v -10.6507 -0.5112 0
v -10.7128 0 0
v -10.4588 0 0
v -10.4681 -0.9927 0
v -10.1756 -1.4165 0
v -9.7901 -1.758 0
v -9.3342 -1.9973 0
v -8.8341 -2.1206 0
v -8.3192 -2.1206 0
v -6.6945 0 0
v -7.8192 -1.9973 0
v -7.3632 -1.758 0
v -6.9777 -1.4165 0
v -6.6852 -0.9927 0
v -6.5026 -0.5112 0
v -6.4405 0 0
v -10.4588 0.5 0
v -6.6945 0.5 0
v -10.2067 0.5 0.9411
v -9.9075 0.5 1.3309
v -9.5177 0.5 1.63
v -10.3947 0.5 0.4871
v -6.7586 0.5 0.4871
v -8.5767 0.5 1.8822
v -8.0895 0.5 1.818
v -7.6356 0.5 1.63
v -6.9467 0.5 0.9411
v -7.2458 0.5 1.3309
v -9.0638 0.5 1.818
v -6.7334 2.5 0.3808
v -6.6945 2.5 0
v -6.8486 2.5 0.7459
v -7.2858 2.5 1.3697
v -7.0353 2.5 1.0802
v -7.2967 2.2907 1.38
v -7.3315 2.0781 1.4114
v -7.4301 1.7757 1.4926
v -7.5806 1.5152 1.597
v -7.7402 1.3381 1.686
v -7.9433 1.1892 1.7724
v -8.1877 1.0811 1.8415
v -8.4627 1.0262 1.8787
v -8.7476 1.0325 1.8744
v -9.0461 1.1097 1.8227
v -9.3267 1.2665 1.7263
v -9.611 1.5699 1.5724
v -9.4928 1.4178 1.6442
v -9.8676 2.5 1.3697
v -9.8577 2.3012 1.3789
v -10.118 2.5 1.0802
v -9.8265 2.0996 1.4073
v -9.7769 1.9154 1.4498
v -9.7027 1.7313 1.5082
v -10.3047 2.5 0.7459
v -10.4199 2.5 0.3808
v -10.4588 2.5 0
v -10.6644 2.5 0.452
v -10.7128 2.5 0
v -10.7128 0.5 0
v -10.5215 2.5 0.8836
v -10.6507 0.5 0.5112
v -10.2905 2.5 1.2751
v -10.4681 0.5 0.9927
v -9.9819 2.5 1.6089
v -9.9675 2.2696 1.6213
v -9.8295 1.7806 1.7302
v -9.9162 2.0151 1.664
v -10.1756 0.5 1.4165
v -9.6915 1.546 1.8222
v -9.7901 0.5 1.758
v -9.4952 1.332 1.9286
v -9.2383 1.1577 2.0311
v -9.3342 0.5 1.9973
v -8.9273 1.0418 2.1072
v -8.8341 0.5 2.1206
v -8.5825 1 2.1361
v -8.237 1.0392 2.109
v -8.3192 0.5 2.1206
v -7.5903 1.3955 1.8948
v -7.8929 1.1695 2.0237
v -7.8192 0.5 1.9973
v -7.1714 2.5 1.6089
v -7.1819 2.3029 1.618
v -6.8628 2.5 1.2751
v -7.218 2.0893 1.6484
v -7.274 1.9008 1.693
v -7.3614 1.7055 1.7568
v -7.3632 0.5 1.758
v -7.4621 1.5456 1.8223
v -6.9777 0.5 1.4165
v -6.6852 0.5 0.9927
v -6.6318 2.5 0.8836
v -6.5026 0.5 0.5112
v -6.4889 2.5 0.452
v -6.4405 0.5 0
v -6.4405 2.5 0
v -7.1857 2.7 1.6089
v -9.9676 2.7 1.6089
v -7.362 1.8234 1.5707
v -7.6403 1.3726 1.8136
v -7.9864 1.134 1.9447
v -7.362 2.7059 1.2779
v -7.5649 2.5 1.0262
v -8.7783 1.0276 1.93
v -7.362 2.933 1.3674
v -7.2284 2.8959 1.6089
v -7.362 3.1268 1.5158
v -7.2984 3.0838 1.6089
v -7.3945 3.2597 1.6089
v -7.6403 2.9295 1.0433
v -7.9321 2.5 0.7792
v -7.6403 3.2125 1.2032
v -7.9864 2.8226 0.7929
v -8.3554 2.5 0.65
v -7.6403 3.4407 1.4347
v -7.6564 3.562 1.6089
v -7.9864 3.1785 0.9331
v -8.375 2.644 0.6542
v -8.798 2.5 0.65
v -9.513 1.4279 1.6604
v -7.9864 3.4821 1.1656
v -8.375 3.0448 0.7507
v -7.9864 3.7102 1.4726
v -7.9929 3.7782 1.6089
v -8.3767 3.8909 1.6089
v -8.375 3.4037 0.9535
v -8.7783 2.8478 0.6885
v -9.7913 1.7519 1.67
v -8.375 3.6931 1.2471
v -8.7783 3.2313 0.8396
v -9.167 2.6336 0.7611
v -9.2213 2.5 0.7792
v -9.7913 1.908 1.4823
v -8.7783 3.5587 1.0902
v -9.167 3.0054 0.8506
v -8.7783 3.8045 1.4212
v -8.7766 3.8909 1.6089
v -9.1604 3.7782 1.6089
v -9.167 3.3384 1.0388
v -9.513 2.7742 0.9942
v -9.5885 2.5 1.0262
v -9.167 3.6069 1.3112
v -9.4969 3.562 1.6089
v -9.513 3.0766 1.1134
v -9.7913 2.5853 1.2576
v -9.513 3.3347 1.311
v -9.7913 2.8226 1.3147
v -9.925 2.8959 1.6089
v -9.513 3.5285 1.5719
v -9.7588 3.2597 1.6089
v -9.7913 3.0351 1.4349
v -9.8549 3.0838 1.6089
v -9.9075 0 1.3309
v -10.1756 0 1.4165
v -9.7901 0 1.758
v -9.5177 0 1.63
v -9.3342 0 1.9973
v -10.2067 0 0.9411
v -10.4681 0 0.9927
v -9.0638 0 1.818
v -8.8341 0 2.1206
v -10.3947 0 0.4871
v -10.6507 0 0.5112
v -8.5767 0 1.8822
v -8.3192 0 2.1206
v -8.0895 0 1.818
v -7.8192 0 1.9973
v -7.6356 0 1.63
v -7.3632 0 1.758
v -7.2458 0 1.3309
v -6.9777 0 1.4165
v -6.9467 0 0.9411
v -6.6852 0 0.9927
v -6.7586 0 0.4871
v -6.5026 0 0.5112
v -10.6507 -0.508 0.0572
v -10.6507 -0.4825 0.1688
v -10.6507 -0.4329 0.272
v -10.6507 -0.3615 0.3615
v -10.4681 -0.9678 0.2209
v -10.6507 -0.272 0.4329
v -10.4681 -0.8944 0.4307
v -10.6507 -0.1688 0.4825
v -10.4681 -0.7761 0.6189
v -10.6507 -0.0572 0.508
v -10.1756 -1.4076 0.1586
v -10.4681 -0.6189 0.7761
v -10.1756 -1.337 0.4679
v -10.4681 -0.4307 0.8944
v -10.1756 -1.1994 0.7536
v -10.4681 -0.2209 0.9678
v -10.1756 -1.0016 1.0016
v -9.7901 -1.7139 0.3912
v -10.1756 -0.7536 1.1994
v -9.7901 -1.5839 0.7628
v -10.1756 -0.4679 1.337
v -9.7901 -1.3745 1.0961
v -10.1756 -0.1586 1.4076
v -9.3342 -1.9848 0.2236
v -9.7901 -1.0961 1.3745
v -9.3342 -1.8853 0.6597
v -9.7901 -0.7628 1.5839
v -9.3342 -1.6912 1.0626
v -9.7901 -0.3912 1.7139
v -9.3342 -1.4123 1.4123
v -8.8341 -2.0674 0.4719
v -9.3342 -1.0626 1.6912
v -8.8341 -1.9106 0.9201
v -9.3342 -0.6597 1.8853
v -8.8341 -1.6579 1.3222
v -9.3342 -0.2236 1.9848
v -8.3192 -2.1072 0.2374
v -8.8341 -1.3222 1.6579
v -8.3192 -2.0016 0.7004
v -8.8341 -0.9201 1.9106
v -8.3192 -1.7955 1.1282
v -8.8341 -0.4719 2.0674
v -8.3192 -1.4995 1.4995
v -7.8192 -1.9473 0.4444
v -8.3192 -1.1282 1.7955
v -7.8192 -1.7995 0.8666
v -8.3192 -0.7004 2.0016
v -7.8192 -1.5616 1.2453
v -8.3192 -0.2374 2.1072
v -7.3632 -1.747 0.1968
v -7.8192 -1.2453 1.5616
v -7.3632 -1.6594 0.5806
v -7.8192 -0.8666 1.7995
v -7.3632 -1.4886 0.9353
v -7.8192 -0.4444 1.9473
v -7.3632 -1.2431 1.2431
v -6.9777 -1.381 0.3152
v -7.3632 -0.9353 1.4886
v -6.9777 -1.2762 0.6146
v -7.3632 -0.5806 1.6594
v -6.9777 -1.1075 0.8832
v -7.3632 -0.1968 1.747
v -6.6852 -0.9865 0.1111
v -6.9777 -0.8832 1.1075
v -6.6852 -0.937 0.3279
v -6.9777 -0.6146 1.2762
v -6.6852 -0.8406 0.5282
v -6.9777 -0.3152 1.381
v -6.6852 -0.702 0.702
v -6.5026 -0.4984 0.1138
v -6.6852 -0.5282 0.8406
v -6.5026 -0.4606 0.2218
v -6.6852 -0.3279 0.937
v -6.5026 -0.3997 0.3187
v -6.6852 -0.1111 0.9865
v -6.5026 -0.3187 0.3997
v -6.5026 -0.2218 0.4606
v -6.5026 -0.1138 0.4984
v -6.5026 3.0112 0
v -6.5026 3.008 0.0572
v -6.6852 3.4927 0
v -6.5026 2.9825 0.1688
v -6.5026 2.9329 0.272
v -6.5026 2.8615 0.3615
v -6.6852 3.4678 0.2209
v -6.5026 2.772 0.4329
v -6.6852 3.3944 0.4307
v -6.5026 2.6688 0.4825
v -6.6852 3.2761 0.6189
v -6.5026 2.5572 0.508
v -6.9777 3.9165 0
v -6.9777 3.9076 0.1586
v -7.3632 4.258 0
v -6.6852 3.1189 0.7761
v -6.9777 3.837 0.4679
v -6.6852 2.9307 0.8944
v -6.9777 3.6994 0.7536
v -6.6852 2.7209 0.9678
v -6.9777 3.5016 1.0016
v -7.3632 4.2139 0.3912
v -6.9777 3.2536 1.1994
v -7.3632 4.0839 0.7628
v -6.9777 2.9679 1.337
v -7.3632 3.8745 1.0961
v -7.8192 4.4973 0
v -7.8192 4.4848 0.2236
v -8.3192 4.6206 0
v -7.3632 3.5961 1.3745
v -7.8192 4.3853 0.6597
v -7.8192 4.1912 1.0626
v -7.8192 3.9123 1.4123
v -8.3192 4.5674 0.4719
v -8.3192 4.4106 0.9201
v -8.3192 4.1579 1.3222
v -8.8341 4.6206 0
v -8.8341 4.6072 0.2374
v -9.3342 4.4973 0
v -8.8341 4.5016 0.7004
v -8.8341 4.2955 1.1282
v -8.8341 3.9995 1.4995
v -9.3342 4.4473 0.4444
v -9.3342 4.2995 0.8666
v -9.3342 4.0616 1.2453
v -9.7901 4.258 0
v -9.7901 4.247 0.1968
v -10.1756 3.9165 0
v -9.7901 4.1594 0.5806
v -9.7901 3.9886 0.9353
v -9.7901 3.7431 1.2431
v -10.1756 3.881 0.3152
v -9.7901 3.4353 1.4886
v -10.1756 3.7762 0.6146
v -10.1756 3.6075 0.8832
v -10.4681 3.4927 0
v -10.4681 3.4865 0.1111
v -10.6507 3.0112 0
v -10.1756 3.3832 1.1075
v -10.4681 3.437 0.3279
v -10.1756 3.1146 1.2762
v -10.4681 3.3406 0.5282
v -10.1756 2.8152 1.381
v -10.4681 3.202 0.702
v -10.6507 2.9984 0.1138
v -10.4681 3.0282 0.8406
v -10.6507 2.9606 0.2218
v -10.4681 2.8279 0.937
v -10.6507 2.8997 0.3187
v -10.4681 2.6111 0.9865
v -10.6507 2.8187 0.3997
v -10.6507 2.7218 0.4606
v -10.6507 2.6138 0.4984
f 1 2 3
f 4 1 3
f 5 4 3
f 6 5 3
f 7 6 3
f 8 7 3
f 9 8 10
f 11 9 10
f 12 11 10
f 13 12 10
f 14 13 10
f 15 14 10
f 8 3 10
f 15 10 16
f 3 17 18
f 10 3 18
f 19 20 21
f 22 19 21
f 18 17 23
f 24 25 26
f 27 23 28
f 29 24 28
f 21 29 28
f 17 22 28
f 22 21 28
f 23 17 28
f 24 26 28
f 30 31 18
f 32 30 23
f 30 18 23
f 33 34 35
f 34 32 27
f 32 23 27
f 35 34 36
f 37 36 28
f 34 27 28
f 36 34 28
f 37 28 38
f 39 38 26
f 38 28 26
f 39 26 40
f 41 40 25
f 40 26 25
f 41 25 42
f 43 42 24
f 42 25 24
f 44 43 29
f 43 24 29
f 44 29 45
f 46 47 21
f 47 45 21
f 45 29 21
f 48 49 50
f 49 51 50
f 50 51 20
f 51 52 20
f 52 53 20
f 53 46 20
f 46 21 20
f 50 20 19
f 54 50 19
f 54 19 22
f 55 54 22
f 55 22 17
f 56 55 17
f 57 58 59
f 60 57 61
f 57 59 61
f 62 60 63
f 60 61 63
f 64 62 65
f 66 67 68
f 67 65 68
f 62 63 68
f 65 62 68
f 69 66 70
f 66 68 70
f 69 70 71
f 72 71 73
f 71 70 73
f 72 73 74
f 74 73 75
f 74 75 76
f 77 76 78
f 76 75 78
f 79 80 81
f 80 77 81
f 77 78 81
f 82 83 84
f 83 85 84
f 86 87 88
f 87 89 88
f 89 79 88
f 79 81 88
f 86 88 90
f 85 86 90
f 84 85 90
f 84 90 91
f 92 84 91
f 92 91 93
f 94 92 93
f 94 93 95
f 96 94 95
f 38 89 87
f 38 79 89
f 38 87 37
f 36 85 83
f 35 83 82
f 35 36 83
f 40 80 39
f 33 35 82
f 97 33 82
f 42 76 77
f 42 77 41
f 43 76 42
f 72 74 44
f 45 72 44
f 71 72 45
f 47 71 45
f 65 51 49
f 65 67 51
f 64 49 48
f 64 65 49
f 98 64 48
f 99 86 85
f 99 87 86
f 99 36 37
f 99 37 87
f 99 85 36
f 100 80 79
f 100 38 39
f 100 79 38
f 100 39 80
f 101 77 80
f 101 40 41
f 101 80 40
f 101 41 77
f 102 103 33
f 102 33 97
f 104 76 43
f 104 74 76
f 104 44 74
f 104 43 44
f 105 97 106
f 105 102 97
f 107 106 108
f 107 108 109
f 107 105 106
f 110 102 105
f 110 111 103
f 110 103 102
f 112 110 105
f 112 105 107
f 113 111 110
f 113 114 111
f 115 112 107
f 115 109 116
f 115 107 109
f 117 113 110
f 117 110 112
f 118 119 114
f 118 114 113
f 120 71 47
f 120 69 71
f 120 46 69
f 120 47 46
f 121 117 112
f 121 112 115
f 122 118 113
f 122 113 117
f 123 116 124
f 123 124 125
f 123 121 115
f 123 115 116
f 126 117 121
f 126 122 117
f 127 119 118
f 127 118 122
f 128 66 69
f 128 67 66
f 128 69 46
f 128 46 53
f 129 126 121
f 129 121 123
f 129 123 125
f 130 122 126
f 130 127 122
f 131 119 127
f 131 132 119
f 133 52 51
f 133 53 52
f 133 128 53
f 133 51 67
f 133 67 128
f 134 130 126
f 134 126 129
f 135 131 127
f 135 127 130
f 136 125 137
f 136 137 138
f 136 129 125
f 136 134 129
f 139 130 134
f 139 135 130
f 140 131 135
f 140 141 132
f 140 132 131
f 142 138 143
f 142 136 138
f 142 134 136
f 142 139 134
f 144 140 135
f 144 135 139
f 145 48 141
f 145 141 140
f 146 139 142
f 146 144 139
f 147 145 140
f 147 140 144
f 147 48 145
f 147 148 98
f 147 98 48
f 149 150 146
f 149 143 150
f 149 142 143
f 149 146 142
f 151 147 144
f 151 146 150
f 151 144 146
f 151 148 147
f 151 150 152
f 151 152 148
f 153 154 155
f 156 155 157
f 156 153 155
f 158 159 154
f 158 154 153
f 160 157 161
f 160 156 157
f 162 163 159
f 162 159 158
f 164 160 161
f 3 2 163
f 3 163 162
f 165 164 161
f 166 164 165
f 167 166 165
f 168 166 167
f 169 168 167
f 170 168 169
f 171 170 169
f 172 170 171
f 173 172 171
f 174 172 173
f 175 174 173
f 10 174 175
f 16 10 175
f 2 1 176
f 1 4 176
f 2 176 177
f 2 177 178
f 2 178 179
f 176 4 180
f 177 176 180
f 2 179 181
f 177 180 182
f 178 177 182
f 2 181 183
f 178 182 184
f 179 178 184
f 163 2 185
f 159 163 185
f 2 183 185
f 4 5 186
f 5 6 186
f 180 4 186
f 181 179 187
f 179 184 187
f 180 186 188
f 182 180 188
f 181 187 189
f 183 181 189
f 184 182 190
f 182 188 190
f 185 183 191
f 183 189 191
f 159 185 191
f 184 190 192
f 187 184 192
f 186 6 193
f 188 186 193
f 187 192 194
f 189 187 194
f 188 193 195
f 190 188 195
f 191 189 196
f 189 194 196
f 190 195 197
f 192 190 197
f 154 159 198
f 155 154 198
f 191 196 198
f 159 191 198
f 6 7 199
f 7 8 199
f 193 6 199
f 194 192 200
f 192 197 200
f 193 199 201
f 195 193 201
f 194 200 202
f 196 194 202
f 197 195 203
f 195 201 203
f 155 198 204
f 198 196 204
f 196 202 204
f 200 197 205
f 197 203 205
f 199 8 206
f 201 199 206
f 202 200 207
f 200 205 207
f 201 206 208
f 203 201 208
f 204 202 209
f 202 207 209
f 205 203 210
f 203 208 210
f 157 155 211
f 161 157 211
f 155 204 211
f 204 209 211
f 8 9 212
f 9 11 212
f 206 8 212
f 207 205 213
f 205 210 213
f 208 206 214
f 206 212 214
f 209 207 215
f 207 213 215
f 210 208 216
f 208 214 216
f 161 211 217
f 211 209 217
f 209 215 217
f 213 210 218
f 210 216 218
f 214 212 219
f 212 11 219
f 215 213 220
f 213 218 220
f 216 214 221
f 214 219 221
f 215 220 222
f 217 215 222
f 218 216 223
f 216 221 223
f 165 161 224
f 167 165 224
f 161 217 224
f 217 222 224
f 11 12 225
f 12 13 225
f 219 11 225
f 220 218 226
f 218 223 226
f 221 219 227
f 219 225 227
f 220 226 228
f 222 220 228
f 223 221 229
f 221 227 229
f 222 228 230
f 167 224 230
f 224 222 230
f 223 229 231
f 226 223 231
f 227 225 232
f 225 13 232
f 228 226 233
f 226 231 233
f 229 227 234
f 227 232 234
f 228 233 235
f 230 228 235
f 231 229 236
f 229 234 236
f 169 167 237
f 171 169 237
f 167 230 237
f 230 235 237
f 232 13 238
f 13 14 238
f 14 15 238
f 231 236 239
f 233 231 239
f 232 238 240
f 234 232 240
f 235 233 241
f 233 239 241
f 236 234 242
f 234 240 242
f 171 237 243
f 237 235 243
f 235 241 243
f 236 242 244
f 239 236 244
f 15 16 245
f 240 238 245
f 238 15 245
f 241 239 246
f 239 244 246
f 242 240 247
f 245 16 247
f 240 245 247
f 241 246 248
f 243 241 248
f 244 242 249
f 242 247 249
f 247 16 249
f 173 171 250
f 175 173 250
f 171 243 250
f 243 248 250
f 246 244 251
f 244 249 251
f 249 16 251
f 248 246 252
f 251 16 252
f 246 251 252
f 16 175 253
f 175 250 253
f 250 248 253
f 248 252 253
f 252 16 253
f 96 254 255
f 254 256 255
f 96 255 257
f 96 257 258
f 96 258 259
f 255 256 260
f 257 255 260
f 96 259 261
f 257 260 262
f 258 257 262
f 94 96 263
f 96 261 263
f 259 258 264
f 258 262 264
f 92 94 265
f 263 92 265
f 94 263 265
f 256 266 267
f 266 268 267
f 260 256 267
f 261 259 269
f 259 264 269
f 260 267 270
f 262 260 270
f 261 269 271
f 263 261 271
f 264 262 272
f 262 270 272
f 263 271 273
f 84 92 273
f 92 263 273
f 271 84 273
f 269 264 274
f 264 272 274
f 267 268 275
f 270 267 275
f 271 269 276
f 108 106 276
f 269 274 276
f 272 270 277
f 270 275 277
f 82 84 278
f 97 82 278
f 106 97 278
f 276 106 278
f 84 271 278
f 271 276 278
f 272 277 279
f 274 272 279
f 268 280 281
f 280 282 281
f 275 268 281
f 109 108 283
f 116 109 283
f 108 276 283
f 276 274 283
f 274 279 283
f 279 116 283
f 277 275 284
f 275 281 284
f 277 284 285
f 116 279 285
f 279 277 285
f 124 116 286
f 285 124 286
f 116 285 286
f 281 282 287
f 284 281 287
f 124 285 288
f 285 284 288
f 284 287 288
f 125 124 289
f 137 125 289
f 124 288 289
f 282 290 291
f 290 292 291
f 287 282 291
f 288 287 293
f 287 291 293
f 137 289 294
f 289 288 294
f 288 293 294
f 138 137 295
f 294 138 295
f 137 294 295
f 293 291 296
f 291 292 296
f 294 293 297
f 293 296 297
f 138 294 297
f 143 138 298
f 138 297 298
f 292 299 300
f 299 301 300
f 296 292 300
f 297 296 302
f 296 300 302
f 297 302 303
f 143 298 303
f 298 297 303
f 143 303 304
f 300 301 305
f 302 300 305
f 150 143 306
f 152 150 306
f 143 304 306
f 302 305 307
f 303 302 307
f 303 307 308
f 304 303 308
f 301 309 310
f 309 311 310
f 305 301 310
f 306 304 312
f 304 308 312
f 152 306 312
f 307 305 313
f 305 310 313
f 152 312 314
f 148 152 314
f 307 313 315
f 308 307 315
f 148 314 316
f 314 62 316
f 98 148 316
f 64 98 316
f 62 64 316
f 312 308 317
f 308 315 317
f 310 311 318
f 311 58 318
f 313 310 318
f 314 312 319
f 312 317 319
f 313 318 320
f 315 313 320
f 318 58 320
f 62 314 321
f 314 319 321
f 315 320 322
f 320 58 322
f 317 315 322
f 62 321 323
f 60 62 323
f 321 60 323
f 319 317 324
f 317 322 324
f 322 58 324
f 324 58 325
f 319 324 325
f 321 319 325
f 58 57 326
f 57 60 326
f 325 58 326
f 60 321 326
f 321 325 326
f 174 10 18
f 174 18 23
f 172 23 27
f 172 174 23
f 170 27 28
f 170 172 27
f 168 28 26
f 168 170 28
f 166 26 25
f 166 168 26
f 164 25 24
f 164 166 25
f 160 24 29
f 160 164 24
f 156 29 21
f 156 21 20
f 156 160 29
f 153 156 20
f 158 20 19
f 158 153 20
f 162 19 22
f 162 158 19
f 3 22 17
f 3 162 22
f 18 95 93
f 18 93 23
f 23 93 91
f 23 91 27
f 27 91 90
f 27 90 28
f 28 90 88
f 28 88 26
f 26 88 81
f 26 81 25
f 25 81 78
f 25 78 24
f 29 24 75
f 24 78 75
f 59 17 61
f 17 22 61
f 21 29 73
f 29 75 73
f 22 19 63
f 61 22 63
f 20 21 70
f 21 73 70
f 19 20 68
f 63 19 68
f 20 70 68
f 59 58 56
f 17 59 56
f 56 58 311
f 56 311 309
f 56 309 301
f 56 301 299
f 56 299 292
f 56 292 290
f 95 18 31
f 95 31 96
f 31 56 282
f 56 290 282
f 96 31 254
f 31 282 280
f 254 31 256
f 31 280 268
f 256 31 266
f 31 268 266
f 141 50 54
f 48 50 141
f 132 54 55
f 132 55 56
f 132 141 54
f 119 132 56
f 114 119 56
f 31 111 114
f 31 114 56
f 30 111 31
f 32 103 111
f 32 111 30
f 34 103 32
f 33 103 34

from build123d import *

# Parameters (mm, degrees)
F2_ANGLE = -90
F3_DEPTH = 0.5
F5_DEPTH = 2
F7_ANGLE = 90


with BuildPart() as f2:
    # F1 (on Top) → F2 (revolve)
    with BuildSketch(Plane.XY):
        with BuildLine():
            Line((-6.440515, 0), (-10.712815, 0))
            ThreePointArc((-10.712815, 0), (-8.576665, -2.13615), (-6.440515, 0))
        make_face()
    revolve(axis=Axis((-8.576665, 0, 0), (1, 0, 0)), revolution_arc=F2_ANGLE)

    # F0 (on Front) → F3 (join)
    with BuildSketch(Plane.XZ):
        with BuildLine():
            Line((-10.458815, 0), (-6.694515, 0))
            ThreePointArc((-6.694515, 0), (-8.576665, 1.88215), (-10.458815, 0))
        make_face()
    extrude(amount=-F3_DEPTH)


with BuildPart() as f5:
    # F4 (on face) → F5 (new body)
    with BuildSketch(Plane(origin=(0, 0.5, 0), x_dir=(-1, 0, 0), z_dir=(0, 1, 0))):
        with BuildLine():
            Line((10.458815, 0), (10.712815, 0))
            ThreePointArc((10.712815, 0), (8.576665, 2.13615), (6.440515, 0))
            Line((6.440515, 0), (6.694515, 0))
            ThreePointArc((6.694515, 0), (8.576665, 1.88215), (10.458815, 0))
        make_face()
    extrude(amount=F5_DEPTH)

    # F6 (on Top) → F7 (revolve)
    with BuildSketch(Plane.XY):
        with BuildLine():
            Line((-10.712815, 2.5), (-6.440515, 2.5))
            ThreePointArc((-6.440515, 2.5), (-8.576665, 4.63615), (-10.712815, 2.5))
        make_face()
    revolve(axis=Axis((-8.576665, 2.5, 0), (1, 0, 0)), revolution_arc=F7_ANGLE)

    # F9 (on offset) → F10 (revolve, cut)
    with BuildSketch(Plane.XY.offset(2.1336)):
        with BuildLine():
            ThreePointArc((-7.076665, 2.5), (-8.576665, 4), (-10.076665, 2.5))
            Line((-10.076665, 2.5), (-7.076665, 2.5))
        make_face()
    revolve(axis=Axis((-8.576665, 2.5, 2.1336), (1, 0, 0)), mode=Mode.SUBTRACT)


solid = Compound([f2.part, f5.part])
